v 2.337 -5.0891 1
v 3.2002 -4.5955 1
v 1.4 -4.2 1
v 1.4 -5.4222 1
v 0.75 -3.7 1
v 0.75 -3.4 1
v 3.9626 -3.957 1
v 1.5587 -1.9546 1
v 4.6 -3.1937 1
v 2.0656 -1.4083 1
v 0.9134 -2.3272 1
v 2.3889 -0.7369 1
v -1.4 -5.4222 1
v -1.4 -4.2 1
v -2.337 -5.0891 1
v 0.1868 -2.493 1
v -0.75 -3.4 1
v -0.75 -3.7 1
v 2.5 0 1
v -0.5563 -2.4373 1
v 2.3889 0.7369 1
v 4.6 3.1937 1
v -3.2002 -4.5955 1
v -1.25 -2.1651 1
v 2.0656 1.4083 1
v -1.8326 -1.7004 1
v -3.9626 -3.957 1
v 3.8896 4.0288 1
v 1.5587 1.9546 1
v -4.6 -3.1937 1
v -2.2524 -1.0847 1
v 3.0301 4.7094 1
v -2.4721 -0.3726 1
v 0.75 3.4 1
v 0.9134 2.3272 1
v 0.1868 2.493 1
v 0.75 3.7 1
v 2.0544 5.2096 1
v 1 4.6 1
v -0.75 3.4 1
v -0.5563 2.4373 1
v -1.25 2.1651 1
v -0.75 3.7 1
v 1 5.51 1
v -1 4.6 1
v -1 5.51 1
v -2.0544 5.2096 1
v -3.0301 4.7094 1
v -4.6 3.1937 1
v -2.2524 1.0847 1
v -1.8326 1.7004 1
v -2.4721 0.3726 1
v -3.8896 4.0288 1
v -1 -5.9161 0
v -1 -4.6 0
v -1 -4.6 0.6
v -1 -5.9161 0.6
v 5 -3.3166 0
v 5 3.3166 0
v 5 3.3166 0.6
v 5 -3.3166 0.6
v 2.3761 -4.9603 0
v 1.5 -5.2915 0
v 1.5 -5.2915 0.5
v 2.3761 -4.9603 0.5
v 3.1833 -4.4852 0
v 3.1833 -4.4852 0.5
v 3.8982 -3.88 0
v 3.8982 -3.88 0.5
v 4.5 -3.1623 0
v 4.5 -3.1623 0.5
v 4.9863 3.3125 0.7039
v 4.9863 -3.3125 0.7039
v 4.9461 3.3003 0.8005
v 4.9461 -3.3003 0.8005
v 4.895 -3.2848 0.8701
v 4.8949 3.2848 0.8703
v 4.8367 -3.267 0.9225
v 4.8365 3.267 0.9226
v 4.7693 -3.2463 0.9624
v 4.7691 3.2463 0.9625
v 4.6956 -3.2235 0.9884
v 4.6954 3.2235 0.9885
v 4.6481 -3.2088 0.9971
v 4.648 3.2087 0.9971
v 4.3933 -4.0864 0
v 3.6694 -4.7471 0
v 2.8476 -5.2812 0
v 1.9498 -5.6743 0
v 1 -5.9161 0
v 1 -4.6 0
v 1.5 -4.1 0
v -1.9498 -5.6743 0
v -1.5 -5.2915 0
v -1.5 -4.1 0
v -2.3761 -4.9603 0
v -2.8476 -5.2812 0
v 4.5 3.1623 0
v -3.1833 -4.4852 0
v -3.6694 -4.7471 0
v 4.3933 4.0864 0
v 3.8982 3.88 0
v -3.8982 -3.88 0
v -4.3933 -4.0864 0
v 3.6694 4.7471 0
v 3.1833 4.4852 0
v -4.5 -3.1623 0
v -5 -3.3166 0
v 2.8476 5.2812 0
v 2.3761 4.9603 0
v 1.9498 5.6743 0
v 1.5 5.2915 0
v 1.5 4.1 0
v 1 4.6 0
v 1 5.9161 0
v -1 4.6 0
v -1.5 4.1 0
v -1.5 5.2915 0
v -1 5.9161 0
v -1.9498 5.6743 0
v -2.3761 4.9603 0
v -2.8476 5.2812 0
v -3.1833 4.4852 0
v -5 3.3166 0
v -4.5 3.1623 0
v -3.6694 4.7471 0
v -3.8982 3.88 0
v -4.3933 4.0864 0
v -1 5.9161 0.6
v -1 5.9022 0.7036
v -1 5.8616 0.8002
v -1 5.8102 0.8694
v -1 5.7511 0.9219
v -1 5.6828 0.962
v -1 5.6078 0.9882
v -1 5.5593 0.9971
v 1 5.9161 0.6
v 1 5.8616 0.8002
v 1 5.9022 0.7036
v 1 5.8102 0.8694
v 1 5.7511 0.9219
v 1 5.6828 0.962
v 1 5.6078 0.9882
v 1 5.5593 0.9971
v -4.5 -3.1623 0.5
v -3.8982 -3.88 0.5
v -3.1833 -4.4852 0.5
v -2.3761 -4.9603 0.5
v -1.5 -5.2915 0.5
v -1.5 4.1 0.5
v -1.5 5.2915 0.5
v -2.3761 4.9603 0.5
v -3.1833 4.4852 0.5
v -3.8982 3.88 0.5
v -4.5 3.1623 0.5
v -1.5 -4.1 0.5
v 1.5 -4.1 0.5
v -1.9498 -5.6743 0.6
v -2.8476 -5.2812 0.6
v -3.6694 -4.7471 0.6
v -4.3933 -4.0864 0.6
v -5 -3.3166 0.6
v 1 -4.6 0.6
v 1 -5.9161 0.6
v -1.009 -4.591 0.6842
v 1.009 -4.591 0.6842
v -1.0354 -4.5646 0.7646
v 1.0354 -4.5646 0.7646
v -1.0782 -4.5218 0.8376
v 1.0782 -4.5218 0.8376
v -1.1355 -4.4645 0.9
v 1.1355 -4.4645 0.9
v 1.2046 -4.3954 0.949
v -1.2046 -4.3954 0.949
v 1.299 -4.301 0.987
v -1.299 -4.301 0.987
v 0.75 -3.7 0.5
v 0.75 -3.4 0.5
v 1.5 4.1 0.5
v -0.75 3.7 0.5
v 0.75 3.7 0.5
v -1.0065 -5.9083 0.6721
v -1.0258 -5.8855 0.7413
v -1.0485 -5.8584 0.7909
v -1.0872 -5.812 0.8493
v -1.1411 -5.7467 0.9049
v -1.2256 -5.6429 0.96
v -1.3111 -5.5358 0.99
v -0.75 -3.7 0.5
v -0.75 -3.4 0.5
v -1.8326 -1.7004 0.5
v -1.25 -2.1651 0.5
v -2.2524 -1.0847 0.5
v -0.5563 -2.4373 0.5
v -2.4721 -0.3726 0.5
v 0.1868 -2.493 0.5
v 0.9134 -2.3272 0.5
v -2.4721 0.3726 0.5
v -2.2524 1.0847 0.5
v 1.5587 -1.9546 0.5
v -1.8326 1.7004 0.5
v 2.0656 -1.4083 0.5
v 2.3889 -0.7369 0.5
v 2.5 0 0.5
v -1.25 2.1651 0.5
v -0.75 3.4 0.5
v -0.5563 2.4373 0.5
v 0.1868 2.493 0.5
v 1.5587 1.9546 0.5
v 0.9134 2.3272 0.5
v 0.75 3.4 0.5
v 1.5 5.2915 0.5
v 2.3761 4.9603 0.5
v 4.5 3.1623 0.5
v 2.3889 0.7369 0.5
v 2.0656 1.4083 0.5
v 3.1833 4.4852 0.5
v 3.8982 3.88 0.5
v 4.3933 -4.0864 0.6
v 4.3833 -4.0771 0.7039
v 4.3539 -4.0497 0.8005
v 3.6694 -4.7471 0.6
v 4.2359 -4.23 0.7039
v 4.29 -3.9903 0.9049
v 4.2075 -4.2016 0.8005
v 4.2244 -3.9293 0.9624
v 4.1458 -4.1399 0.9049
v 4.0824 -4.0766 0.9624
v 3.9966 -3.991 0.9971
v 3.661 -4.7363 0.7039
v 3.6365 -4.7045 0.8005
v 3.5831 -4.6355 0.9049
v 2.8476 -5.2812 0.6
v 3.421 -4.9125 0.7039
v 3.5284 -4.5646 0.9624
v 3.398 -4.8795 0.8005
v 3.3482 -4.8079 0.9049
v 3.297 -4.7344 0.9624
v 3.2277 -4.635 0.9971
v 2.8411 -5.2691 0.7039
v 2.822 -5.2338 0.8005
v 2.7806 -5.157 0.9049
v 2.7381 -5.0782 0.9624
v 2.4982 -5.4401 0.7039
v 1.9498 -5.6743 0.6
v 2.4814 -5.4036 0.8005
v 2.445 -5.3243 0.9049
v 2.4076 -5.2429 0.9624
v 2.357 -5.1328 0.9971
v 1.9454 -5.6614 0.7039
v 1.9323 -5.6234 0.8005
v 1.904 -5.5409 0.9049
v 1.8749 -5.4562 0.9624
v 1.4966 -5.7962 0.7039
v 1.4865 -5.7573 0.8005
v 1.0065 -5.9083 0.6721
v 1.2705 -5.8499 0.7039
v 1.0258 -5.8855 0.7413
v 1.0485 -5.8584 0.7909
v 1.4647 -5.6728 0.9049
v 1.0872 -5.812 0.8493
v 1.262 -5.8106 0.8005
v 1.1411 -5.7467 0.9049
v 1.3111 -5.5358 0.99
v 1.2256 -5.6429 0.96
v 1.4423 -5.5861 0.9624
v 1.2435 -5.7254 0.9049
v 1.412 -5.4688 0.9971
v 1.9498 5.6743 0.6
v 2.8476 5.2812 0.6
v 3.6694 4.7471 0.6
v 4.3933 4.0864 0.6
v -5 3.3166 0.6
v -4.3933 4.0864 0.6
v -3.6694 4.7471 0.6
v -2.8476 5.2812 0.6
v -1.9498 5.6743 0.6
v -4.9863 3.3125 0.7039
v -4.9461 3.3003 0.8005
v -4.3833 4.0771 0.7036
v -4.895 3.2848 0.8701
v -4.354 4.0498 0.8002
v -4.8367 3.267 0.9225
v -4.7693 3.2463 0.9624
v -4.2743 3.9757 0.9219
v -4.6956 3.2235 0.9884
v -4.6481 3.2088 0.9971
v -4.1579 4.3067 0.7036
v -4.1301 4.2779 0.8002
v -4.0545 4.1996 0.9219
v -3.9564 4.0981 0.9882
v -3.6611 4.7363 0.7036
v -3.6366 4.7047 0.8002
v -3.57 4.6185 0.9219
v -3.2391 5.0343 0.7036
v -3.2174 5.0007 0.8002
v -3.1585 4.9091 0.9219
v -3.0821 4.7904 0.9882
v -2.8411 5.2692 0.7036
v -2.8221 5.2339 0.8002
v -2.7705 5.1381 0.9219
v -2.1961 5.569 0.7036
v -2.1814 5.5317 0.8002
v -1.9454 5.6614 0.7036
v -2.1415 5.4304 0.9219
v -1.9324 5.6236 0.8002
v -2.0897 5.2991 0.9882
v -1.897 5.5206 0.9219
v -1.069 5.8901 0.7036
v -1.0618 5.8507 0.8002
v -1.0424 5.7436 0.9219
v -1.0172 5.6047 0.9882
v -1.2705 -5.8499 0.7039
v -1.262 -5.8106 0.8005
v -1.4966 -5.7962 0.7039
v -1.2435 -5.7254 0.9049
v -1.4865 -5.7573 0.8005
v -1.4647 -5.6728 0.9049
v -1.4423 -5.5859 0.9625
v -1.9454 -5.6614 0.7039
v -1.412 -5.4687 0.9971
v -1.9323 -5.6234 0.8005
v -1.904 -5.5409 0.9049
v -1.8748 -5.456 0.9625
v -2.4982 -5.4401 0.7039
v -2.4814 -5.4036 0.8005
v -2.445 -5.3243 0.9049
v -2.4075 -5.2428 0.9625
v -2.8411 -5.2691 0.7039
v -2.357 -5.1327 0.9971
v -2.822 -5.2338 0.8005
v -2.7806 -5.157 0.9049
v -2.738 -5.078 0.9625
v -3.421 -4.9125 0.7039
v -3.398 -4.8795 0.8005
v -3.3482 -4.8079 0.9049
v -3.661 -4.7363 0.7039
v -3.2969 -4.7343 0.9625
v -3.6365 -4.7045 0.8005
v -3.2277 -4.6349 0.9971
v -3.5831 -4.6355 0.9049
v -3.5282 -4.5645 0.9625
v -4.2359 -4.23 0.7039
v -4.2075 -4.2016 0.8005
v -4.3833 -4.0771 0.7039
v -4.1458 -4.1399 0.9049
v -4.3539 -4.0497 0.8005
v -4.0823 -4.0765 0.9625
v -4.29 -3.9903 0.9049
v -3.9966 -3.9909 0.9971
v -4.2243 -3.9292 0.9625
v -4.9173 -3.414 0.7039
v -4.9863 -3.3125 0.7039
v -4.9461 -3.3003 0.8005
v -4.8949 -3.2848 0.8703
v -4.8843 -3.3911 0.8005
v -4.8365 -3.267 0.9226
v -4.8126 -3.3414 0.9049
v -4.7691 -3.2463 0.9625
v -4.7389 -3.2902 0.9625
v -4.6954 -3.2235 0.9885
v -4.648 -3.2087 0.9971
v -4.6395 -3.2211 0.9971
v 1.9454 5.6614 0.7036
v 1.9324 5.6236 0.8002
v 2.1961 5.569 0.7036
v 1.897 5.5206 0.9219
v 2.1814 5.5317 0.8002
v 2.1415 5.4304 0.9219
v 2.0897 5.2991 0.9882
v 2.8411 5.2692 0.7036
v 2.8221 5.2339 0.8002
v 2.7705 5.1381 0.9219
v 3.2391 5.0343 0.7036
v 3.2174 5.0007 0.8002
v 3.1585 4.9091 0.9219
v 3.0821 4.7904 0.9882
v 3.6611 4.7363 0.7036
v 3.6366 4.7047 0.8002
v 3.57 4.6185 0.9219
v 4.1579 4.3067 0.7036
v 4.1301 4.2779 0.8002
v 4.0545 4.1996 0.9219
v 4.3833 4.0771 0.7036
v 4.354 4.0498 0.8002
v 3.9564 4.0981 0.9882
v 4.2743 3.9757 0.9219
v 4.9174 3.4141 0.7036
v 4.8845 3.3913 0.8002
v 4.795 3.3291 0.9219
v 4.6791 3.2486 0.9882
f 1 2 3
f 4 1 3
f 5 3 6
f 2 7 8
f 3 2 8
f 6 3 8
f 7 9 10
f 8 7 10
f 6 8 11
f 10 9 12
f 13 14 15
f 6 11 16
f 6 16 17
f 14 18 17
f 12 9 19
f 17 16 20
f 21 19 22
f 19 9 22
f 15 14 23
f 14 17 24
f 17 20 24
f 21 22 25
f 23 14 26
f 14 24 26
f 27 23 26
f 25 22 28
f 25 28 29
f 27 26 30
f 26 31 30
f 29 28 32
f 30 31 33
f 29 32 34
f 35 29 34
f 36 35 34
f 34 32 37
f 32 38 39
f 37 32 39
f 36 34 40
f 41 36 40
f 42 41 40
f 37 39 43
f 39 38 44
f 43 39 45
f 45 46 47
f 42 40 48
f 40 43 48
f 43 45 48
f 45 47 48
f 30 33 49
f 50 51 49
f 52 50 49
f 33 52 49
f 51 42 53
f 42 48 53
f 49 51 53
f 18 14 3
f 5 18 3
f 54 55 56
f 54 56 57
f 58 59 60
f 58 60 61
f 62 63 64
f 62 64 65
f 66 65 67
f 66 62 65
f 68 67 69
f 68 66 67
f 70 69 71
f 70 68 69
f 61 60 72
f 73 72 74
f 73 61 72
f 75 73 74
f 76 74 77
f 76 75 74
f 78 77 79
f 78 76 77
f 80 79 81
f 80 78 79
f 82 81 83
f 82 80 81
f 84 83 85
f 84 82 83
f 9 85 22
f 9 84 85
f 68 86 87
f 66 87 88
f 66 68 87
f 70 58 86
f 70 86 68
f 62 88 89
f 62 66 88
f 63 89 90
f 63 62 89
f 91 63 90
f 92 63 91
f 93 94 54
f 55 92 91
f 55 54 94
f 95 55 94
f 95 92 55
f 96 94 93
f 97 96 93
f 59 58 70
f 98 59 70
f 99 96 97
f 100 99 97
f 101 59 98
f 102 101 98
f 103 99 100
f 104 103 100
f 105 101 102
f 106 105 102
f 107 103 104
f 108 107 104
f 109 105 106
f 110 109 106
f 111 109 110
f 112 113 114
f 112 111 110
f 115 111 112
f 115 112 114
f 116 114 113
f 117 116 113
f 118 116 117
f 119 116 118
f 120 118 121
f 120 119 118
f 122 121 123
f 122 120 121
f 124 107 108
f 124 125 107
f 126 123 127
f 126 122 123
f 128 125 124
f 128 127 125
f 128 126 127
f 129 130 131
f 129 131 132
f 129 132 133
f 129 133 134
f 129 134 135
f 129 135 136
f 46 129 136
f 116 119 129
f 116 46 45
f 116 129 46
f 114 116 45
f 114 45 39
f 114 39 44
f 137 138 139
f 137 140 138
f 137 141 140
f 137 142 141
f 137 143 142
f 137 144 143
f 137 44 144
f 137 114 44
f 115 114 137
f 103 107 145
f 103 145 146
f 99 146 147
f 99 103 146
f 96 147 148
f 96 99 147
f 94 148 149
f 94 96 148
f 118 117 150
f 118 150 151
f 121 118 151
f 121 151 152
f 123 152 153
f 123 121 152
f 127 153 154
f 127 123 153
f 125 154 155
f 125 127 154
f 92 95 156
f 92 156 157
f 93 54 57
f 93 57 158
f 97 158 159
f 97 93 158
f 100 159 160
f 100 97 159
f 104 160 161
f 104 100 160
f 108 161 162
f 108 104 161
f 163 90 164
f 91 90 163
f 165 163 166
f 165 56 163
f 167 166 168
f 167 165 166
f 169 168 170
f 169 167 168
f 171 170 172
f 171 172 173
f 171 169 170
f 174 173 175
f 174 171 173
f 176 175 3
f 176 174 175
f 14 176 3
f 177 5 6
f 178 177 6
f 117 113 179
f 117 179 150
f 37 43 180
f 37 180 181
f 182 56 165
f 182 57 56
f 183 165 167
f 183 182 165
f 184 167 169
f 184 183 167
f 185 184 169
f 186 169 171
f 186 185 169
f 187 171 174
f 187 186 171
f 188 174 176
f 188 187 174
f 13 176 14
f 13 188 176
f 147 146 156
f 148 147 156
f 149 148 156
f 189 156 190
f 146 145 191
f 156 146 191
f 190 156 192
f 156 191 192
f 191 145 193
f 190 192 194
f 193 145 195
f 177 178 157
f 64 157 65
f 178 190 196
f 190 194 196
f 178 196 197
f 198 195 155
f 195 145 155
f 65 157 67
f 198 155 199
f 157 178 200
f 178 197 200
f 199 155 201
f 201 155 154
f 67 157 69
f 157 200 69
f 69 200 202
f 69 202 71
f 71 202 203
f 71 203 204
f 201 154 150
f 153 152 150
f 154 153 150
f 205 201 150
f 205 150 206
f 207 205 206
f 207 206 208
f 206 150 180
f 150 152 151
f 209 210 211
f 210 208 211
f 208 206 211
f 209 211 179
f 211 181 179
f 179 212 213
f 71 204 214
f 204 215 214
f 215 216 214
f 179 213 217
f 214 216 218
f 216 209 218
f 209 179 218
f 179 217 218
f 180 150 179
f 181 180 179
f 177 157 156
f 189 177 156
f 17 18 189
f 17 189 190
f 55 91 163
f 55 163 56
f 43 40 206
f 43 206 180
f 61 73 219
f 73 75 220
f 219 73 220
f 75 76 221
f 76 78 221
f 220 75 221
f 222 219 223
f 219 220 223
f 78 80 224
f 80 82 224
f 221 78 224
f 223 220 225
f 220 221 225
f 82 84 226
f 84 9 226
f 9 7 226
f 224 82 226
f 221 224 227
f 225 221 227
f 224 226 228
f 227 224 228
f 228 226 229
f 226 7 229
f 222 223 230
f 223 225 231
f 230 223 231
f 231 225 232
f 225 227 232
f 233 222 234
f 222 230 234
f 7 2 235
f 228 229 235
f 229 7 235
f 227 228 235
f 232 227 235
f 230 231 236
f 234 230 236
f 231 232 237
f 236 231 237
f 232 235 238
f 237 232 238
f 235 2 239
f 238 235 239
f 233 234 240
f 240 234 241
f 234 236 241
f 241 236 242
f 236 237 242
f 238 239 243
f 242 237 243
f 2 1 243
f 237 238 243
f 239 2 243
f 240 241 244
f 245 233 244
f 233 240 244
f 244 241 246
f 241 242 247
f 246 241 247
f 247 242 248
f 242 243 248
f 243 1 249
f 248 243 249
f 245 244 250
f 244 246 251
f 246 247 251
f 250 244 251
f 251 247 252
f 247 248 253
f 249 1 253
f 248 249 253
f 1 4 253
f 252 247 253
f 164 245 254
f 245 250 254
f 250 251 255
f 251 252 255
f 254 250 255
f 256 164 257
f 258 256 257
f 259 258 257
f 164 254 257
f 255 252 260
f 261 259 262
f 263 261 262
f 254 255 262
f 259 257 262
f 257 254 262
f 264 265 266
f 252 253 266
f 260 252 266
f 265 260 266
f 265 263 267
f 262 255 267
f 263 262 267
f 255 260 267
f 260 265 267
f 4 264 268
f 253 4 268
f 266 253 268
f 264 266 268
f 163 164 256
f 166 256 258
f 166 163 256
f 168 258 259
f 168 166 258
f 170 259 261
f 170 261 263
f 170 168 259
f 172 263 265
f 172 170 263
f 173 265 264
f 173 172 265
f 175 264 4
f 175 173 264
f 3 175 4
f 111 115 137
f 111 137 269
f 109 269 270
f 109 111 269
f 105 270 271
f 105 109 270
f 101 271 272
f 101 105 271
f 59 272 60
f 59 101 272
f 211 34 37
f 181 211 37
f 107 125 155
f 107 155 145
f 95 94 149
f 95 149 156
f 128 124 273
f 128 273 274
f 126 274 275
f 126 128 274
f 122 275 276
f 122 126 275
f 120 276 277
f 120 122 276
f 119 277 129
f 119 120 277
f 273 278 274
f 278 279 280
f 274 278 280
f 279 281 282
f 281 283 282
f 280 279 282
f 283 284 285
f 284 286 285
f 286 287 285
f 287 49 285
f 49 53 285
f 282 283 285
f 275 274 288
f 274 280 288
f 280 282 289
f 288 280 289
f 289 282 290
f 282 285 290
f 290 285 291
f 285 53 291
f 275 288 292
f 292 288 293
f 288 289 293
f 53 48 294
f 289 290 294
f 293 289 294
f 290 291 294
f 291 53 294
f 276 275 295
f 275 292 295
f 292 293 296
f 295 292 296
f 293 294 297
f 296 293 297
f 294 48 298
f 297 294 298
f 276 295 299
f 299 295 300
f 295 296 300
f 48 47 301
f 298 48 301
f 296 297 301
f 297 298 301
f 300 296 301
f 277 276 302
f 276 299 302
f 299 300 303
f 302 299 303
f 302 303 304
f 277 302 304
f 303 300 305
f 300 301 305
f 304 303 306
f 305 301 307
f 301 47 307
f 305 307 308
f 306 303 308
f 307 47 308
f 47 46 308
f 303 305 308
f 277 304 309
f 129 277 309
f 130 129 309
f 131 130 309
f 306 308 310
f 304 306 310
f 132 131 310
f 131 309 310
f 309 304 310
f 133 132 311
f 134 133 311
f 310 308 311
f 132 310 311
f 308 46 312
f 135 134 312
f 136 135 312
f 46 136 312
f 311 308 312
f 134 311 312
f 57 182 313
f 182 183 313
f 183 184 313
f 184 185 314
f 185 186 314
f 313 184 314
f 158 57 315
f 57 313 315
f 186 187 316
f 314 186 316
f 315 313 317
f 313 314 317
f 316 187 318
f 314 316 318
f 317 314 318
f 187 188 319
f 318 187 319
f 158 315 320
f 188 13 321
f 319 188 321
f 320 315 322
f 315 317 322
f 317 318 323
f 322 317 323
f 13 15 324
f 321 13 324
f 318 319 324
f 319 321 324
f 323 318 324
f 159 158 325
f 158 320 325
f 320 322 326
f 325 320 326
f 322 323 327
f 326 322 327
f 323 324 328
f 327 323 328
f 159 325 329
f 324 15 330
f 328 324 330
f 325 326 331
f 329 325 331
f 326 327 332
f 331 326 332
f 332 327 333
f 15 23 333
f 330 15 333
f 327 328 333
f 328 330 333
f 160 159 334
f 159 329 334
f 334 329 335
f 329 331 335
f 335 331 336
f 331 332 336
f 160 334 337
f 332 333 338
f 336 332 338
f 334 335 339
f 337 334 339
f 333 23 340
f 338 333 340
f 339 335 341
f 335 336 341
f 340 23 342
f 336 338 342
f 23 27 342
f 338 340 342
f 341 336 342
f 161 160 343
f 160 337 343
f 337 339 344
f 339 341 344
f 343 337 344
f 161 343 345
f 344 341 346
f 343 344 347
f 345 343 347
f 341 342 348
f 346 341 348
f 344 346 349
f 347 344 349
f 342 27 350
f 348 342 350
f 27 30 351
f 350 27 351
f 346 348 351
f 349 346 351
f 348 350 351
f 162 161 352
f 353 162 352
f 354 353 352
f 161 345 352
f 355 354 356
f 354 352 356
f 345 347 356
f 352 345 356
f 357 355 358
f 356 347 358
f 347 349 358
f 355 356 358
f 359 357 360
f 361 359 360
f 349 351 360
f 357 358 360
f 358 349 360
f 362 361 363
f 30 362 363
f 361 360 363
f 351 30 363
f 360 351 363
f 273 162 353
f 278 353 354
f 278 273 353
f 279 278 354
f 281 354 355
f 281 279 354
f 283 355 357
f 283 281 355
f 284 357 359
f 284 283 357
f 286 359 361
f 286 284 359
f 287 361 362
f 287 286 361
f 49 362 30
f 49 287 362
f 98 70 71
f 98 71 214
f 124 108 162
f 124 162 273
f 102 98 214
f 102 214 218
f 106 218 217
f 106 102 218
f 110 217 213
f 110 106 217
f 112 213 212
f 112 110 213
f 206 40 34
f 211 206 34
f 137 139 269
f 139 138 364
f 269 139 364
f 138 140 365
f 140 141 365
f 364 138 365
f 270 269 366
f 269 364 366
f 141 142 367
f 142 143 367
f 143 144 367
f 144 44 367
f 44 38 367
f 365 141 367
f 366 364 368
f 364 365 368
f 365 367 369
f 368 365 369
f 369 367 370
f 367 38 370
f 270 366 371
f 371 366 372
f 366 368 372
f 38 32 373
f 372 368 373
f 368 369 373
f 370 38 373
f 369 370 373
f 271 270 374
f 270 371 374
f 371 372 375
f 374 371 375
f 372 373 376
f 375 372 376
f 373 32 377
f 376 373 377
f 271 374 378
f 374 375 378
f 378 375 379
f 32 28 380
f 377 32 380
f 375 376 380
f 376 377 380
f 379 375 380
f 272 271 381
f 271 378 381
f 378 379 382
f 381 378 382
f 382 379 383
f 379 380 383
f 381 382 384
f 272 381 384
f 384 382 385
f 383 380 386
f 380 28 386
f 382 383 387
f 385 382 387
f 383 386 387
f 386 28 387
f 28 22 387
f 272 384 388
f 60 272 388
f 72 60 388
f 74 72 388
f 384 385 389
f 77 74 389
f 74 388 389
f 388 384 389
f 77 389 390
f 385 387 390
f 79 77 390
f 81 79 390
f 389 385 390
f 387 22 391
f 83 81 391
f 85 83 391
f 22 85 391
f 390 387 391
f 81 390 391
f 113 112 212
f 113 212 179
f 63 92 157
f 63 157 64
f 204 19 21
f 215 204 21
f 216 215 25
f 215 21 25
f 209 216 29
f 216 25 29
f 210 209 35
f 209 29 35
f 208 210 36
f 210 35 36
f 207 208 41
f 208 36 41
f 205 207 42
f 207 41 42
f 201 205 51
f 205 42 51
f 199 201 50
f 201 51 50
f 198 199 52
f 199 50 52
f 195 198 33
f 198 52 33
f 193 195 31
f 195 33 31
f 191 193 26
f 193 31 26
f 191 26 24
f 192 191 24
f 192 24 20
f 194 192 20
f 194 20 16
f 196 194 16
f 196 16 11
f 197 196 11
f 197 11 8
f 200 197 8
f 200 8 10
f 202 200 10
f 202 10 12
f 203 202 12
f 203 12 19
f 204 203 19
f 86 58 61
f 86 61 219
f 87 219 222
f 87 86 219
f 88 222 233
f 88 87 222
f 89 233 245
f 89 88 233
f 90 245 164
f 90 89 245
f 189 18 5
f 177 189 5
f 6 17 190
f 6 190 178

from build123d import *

# Parameters (mm, degrees)
BOSS_EXTRUDE1_DEPTH = 1
FILLET1_R           = 0.4
SHELL1_DEPTH        = 0.5
SKETCH3_R           = 2.5
CUT_EXTRUDE1_DEPTH  = 1
CUT_EXTRUDE2_REACH  = 9.81
SKETCH4_W           = 1.5
SKETCH4_H           = 0.3


# Read off the part's stored shape, not the designer's step: Shell1
with BuildPart() as part:
    # Sketch2 → Boss-Extrude1 (new body)
    with BuildSketch(Plane.XY):
        with BuildLine():
            Line((-5, -3.31662479), (-5, 3.31662479))
            ThreePointArc((-5, 3.31662479), (-3.269448205, 5.030974899), (-1, 5.916079783))
            Line((-1, 5.916079783), (-1, 4.6))
            Line((-1, 4.6), (1, 4.6))
            Line((1, 4.6), (1, 5.916079783))
            ThreePointArc((1, 5.916079783), (3.269448205, 5.030974899), (5, 3.31662479))
            Line((5, 3.31662479), (5, -3.31662479))
            ThreePointArc((5, -3.31662479), (3.269448205, -5.030974899), (1, -5.916079783))
            Line((1, -5.916079783), (1, -4.6))
            Line((1, -4.6), (-1, -4.6))
            Line((-1, -4.6), (-1, -5.916079783))
            ThreePointArc((-1, -5.916079783), (-3.269448205, -5.030974899), (-5, -3.31662479))
        make_face()
    extrude(amount=BOSS_EXTRUDE1_DEPTH)

    # Fillet1
    fillet1_edges = [part.edges().sort_by_distance(p)[0] for p in [
        (3.269448205, 5.030974899, 1),
        (5, 0, 1),
        (3.269448205, -5.030974899, 1),
        (1, -5.258039892, 1),
        (0, -4.6, 1),
        (-1, -5.258039892, 1),
        (-3.269448205, -5.030974899, 1),
        (-5, 0, 1),
        (-3.269448205, 5.030974899, 1),
    ]]
    fillet(fillet1_edges, radius=FILLET1_R)

    # Shell1 outline → Shell1 (cut)
    with BuildSketch(Plane.XY):
        with BuildLine():
            ThreePointArc((1.5, -5.291502622), (3.183300133, -4.485153316), (4.5, -3.16227766))
            Line((4.5, -3.16227766), (4.5, 3.16227766))
            ThreePointArc((4.5, 3.16227766), (3.183300133, 4.485153316), (1.5, 5.291502622))
            Line((1.5, 5.291502622), (1.5, 4.1))
            Line((1.5, 4.1), (-1.5, 4.1))
            Line((-1.5, 4.1), (-1.5, 5.291502622))
            ThreePointArc((-1.5, 5.291502622), (-3.183300133, 4.485153316), (-4.5, 3.16227766))
            Line((-4.5, 3.16227766), (-4.5, -3.16227766))
            ThreePointArc((-4.5, -3.16227766), (-3.183300133, -4.485153316), (-1.5, -5.291502622))
            Line((-1.5, -5.291502622), (-1.5, -4.1))
            Line((-1.5, -4.1), (1.5, -4.1))
            Line((1.5, -4.1), (1.5, -5.291502622))
        make_face()
    extrude(amount=SHELL1_DEPTH, mode=Mode.SUBTRACT)

    # Sketch3 → Cut-Extrude1 (cut)
    with BuildSketch(Plane.XY.offset(1)):
        Circle(SKETCH3_R)
    extrude(amount=-CUT_EXTRUDE1_DEPTH, mode=Mode.SUBTRACT)

    # Sketch4 → Cut-Extrude2 (cut, up to next)
    with BuildSketch(Plane.XY.offset(1), mode=Mode.PRIVATE) as cut_extrude2_sk1:
        with Locations((0, 3.55)):
            Rectangle(SKETCH4_W, SKETCH4_H)
    cut_extrude2_tool1 = extrude(cut_extrude2_sk1.sketch, amount=-CUT_EXTRUDE2_REACH, mode=Mode.PRIVATE) & part.part
    # Sketch4 → Cut-Extrude2 (cut, up to next)
    with BuildSketch(Plane.XY.offset(1), mode=Mode.PRIVATE) as cut_extrude2_sk2:
        with Locations((0, -3.55)):
            Rectangle(SKETCH4_W, SKETCH4_H)
    cut_extrude2_tool2 = extrude(cut_extrude2_sk2.sketch, amount=-CUT_EXTRUDE2_REACH, mode=Mode.PRIVATE) & part.part
    add(cut_extrude2_tool1.solids().sort_by_distance((0, 3.55, 1))[0], mode=Mode.SUBTRACT)
    add(cut_extrude2_tool2.solids().sort_by_distance((0, -3.55, 1))[0], mode=Mode.SUBTRACT)


solid = part.part
